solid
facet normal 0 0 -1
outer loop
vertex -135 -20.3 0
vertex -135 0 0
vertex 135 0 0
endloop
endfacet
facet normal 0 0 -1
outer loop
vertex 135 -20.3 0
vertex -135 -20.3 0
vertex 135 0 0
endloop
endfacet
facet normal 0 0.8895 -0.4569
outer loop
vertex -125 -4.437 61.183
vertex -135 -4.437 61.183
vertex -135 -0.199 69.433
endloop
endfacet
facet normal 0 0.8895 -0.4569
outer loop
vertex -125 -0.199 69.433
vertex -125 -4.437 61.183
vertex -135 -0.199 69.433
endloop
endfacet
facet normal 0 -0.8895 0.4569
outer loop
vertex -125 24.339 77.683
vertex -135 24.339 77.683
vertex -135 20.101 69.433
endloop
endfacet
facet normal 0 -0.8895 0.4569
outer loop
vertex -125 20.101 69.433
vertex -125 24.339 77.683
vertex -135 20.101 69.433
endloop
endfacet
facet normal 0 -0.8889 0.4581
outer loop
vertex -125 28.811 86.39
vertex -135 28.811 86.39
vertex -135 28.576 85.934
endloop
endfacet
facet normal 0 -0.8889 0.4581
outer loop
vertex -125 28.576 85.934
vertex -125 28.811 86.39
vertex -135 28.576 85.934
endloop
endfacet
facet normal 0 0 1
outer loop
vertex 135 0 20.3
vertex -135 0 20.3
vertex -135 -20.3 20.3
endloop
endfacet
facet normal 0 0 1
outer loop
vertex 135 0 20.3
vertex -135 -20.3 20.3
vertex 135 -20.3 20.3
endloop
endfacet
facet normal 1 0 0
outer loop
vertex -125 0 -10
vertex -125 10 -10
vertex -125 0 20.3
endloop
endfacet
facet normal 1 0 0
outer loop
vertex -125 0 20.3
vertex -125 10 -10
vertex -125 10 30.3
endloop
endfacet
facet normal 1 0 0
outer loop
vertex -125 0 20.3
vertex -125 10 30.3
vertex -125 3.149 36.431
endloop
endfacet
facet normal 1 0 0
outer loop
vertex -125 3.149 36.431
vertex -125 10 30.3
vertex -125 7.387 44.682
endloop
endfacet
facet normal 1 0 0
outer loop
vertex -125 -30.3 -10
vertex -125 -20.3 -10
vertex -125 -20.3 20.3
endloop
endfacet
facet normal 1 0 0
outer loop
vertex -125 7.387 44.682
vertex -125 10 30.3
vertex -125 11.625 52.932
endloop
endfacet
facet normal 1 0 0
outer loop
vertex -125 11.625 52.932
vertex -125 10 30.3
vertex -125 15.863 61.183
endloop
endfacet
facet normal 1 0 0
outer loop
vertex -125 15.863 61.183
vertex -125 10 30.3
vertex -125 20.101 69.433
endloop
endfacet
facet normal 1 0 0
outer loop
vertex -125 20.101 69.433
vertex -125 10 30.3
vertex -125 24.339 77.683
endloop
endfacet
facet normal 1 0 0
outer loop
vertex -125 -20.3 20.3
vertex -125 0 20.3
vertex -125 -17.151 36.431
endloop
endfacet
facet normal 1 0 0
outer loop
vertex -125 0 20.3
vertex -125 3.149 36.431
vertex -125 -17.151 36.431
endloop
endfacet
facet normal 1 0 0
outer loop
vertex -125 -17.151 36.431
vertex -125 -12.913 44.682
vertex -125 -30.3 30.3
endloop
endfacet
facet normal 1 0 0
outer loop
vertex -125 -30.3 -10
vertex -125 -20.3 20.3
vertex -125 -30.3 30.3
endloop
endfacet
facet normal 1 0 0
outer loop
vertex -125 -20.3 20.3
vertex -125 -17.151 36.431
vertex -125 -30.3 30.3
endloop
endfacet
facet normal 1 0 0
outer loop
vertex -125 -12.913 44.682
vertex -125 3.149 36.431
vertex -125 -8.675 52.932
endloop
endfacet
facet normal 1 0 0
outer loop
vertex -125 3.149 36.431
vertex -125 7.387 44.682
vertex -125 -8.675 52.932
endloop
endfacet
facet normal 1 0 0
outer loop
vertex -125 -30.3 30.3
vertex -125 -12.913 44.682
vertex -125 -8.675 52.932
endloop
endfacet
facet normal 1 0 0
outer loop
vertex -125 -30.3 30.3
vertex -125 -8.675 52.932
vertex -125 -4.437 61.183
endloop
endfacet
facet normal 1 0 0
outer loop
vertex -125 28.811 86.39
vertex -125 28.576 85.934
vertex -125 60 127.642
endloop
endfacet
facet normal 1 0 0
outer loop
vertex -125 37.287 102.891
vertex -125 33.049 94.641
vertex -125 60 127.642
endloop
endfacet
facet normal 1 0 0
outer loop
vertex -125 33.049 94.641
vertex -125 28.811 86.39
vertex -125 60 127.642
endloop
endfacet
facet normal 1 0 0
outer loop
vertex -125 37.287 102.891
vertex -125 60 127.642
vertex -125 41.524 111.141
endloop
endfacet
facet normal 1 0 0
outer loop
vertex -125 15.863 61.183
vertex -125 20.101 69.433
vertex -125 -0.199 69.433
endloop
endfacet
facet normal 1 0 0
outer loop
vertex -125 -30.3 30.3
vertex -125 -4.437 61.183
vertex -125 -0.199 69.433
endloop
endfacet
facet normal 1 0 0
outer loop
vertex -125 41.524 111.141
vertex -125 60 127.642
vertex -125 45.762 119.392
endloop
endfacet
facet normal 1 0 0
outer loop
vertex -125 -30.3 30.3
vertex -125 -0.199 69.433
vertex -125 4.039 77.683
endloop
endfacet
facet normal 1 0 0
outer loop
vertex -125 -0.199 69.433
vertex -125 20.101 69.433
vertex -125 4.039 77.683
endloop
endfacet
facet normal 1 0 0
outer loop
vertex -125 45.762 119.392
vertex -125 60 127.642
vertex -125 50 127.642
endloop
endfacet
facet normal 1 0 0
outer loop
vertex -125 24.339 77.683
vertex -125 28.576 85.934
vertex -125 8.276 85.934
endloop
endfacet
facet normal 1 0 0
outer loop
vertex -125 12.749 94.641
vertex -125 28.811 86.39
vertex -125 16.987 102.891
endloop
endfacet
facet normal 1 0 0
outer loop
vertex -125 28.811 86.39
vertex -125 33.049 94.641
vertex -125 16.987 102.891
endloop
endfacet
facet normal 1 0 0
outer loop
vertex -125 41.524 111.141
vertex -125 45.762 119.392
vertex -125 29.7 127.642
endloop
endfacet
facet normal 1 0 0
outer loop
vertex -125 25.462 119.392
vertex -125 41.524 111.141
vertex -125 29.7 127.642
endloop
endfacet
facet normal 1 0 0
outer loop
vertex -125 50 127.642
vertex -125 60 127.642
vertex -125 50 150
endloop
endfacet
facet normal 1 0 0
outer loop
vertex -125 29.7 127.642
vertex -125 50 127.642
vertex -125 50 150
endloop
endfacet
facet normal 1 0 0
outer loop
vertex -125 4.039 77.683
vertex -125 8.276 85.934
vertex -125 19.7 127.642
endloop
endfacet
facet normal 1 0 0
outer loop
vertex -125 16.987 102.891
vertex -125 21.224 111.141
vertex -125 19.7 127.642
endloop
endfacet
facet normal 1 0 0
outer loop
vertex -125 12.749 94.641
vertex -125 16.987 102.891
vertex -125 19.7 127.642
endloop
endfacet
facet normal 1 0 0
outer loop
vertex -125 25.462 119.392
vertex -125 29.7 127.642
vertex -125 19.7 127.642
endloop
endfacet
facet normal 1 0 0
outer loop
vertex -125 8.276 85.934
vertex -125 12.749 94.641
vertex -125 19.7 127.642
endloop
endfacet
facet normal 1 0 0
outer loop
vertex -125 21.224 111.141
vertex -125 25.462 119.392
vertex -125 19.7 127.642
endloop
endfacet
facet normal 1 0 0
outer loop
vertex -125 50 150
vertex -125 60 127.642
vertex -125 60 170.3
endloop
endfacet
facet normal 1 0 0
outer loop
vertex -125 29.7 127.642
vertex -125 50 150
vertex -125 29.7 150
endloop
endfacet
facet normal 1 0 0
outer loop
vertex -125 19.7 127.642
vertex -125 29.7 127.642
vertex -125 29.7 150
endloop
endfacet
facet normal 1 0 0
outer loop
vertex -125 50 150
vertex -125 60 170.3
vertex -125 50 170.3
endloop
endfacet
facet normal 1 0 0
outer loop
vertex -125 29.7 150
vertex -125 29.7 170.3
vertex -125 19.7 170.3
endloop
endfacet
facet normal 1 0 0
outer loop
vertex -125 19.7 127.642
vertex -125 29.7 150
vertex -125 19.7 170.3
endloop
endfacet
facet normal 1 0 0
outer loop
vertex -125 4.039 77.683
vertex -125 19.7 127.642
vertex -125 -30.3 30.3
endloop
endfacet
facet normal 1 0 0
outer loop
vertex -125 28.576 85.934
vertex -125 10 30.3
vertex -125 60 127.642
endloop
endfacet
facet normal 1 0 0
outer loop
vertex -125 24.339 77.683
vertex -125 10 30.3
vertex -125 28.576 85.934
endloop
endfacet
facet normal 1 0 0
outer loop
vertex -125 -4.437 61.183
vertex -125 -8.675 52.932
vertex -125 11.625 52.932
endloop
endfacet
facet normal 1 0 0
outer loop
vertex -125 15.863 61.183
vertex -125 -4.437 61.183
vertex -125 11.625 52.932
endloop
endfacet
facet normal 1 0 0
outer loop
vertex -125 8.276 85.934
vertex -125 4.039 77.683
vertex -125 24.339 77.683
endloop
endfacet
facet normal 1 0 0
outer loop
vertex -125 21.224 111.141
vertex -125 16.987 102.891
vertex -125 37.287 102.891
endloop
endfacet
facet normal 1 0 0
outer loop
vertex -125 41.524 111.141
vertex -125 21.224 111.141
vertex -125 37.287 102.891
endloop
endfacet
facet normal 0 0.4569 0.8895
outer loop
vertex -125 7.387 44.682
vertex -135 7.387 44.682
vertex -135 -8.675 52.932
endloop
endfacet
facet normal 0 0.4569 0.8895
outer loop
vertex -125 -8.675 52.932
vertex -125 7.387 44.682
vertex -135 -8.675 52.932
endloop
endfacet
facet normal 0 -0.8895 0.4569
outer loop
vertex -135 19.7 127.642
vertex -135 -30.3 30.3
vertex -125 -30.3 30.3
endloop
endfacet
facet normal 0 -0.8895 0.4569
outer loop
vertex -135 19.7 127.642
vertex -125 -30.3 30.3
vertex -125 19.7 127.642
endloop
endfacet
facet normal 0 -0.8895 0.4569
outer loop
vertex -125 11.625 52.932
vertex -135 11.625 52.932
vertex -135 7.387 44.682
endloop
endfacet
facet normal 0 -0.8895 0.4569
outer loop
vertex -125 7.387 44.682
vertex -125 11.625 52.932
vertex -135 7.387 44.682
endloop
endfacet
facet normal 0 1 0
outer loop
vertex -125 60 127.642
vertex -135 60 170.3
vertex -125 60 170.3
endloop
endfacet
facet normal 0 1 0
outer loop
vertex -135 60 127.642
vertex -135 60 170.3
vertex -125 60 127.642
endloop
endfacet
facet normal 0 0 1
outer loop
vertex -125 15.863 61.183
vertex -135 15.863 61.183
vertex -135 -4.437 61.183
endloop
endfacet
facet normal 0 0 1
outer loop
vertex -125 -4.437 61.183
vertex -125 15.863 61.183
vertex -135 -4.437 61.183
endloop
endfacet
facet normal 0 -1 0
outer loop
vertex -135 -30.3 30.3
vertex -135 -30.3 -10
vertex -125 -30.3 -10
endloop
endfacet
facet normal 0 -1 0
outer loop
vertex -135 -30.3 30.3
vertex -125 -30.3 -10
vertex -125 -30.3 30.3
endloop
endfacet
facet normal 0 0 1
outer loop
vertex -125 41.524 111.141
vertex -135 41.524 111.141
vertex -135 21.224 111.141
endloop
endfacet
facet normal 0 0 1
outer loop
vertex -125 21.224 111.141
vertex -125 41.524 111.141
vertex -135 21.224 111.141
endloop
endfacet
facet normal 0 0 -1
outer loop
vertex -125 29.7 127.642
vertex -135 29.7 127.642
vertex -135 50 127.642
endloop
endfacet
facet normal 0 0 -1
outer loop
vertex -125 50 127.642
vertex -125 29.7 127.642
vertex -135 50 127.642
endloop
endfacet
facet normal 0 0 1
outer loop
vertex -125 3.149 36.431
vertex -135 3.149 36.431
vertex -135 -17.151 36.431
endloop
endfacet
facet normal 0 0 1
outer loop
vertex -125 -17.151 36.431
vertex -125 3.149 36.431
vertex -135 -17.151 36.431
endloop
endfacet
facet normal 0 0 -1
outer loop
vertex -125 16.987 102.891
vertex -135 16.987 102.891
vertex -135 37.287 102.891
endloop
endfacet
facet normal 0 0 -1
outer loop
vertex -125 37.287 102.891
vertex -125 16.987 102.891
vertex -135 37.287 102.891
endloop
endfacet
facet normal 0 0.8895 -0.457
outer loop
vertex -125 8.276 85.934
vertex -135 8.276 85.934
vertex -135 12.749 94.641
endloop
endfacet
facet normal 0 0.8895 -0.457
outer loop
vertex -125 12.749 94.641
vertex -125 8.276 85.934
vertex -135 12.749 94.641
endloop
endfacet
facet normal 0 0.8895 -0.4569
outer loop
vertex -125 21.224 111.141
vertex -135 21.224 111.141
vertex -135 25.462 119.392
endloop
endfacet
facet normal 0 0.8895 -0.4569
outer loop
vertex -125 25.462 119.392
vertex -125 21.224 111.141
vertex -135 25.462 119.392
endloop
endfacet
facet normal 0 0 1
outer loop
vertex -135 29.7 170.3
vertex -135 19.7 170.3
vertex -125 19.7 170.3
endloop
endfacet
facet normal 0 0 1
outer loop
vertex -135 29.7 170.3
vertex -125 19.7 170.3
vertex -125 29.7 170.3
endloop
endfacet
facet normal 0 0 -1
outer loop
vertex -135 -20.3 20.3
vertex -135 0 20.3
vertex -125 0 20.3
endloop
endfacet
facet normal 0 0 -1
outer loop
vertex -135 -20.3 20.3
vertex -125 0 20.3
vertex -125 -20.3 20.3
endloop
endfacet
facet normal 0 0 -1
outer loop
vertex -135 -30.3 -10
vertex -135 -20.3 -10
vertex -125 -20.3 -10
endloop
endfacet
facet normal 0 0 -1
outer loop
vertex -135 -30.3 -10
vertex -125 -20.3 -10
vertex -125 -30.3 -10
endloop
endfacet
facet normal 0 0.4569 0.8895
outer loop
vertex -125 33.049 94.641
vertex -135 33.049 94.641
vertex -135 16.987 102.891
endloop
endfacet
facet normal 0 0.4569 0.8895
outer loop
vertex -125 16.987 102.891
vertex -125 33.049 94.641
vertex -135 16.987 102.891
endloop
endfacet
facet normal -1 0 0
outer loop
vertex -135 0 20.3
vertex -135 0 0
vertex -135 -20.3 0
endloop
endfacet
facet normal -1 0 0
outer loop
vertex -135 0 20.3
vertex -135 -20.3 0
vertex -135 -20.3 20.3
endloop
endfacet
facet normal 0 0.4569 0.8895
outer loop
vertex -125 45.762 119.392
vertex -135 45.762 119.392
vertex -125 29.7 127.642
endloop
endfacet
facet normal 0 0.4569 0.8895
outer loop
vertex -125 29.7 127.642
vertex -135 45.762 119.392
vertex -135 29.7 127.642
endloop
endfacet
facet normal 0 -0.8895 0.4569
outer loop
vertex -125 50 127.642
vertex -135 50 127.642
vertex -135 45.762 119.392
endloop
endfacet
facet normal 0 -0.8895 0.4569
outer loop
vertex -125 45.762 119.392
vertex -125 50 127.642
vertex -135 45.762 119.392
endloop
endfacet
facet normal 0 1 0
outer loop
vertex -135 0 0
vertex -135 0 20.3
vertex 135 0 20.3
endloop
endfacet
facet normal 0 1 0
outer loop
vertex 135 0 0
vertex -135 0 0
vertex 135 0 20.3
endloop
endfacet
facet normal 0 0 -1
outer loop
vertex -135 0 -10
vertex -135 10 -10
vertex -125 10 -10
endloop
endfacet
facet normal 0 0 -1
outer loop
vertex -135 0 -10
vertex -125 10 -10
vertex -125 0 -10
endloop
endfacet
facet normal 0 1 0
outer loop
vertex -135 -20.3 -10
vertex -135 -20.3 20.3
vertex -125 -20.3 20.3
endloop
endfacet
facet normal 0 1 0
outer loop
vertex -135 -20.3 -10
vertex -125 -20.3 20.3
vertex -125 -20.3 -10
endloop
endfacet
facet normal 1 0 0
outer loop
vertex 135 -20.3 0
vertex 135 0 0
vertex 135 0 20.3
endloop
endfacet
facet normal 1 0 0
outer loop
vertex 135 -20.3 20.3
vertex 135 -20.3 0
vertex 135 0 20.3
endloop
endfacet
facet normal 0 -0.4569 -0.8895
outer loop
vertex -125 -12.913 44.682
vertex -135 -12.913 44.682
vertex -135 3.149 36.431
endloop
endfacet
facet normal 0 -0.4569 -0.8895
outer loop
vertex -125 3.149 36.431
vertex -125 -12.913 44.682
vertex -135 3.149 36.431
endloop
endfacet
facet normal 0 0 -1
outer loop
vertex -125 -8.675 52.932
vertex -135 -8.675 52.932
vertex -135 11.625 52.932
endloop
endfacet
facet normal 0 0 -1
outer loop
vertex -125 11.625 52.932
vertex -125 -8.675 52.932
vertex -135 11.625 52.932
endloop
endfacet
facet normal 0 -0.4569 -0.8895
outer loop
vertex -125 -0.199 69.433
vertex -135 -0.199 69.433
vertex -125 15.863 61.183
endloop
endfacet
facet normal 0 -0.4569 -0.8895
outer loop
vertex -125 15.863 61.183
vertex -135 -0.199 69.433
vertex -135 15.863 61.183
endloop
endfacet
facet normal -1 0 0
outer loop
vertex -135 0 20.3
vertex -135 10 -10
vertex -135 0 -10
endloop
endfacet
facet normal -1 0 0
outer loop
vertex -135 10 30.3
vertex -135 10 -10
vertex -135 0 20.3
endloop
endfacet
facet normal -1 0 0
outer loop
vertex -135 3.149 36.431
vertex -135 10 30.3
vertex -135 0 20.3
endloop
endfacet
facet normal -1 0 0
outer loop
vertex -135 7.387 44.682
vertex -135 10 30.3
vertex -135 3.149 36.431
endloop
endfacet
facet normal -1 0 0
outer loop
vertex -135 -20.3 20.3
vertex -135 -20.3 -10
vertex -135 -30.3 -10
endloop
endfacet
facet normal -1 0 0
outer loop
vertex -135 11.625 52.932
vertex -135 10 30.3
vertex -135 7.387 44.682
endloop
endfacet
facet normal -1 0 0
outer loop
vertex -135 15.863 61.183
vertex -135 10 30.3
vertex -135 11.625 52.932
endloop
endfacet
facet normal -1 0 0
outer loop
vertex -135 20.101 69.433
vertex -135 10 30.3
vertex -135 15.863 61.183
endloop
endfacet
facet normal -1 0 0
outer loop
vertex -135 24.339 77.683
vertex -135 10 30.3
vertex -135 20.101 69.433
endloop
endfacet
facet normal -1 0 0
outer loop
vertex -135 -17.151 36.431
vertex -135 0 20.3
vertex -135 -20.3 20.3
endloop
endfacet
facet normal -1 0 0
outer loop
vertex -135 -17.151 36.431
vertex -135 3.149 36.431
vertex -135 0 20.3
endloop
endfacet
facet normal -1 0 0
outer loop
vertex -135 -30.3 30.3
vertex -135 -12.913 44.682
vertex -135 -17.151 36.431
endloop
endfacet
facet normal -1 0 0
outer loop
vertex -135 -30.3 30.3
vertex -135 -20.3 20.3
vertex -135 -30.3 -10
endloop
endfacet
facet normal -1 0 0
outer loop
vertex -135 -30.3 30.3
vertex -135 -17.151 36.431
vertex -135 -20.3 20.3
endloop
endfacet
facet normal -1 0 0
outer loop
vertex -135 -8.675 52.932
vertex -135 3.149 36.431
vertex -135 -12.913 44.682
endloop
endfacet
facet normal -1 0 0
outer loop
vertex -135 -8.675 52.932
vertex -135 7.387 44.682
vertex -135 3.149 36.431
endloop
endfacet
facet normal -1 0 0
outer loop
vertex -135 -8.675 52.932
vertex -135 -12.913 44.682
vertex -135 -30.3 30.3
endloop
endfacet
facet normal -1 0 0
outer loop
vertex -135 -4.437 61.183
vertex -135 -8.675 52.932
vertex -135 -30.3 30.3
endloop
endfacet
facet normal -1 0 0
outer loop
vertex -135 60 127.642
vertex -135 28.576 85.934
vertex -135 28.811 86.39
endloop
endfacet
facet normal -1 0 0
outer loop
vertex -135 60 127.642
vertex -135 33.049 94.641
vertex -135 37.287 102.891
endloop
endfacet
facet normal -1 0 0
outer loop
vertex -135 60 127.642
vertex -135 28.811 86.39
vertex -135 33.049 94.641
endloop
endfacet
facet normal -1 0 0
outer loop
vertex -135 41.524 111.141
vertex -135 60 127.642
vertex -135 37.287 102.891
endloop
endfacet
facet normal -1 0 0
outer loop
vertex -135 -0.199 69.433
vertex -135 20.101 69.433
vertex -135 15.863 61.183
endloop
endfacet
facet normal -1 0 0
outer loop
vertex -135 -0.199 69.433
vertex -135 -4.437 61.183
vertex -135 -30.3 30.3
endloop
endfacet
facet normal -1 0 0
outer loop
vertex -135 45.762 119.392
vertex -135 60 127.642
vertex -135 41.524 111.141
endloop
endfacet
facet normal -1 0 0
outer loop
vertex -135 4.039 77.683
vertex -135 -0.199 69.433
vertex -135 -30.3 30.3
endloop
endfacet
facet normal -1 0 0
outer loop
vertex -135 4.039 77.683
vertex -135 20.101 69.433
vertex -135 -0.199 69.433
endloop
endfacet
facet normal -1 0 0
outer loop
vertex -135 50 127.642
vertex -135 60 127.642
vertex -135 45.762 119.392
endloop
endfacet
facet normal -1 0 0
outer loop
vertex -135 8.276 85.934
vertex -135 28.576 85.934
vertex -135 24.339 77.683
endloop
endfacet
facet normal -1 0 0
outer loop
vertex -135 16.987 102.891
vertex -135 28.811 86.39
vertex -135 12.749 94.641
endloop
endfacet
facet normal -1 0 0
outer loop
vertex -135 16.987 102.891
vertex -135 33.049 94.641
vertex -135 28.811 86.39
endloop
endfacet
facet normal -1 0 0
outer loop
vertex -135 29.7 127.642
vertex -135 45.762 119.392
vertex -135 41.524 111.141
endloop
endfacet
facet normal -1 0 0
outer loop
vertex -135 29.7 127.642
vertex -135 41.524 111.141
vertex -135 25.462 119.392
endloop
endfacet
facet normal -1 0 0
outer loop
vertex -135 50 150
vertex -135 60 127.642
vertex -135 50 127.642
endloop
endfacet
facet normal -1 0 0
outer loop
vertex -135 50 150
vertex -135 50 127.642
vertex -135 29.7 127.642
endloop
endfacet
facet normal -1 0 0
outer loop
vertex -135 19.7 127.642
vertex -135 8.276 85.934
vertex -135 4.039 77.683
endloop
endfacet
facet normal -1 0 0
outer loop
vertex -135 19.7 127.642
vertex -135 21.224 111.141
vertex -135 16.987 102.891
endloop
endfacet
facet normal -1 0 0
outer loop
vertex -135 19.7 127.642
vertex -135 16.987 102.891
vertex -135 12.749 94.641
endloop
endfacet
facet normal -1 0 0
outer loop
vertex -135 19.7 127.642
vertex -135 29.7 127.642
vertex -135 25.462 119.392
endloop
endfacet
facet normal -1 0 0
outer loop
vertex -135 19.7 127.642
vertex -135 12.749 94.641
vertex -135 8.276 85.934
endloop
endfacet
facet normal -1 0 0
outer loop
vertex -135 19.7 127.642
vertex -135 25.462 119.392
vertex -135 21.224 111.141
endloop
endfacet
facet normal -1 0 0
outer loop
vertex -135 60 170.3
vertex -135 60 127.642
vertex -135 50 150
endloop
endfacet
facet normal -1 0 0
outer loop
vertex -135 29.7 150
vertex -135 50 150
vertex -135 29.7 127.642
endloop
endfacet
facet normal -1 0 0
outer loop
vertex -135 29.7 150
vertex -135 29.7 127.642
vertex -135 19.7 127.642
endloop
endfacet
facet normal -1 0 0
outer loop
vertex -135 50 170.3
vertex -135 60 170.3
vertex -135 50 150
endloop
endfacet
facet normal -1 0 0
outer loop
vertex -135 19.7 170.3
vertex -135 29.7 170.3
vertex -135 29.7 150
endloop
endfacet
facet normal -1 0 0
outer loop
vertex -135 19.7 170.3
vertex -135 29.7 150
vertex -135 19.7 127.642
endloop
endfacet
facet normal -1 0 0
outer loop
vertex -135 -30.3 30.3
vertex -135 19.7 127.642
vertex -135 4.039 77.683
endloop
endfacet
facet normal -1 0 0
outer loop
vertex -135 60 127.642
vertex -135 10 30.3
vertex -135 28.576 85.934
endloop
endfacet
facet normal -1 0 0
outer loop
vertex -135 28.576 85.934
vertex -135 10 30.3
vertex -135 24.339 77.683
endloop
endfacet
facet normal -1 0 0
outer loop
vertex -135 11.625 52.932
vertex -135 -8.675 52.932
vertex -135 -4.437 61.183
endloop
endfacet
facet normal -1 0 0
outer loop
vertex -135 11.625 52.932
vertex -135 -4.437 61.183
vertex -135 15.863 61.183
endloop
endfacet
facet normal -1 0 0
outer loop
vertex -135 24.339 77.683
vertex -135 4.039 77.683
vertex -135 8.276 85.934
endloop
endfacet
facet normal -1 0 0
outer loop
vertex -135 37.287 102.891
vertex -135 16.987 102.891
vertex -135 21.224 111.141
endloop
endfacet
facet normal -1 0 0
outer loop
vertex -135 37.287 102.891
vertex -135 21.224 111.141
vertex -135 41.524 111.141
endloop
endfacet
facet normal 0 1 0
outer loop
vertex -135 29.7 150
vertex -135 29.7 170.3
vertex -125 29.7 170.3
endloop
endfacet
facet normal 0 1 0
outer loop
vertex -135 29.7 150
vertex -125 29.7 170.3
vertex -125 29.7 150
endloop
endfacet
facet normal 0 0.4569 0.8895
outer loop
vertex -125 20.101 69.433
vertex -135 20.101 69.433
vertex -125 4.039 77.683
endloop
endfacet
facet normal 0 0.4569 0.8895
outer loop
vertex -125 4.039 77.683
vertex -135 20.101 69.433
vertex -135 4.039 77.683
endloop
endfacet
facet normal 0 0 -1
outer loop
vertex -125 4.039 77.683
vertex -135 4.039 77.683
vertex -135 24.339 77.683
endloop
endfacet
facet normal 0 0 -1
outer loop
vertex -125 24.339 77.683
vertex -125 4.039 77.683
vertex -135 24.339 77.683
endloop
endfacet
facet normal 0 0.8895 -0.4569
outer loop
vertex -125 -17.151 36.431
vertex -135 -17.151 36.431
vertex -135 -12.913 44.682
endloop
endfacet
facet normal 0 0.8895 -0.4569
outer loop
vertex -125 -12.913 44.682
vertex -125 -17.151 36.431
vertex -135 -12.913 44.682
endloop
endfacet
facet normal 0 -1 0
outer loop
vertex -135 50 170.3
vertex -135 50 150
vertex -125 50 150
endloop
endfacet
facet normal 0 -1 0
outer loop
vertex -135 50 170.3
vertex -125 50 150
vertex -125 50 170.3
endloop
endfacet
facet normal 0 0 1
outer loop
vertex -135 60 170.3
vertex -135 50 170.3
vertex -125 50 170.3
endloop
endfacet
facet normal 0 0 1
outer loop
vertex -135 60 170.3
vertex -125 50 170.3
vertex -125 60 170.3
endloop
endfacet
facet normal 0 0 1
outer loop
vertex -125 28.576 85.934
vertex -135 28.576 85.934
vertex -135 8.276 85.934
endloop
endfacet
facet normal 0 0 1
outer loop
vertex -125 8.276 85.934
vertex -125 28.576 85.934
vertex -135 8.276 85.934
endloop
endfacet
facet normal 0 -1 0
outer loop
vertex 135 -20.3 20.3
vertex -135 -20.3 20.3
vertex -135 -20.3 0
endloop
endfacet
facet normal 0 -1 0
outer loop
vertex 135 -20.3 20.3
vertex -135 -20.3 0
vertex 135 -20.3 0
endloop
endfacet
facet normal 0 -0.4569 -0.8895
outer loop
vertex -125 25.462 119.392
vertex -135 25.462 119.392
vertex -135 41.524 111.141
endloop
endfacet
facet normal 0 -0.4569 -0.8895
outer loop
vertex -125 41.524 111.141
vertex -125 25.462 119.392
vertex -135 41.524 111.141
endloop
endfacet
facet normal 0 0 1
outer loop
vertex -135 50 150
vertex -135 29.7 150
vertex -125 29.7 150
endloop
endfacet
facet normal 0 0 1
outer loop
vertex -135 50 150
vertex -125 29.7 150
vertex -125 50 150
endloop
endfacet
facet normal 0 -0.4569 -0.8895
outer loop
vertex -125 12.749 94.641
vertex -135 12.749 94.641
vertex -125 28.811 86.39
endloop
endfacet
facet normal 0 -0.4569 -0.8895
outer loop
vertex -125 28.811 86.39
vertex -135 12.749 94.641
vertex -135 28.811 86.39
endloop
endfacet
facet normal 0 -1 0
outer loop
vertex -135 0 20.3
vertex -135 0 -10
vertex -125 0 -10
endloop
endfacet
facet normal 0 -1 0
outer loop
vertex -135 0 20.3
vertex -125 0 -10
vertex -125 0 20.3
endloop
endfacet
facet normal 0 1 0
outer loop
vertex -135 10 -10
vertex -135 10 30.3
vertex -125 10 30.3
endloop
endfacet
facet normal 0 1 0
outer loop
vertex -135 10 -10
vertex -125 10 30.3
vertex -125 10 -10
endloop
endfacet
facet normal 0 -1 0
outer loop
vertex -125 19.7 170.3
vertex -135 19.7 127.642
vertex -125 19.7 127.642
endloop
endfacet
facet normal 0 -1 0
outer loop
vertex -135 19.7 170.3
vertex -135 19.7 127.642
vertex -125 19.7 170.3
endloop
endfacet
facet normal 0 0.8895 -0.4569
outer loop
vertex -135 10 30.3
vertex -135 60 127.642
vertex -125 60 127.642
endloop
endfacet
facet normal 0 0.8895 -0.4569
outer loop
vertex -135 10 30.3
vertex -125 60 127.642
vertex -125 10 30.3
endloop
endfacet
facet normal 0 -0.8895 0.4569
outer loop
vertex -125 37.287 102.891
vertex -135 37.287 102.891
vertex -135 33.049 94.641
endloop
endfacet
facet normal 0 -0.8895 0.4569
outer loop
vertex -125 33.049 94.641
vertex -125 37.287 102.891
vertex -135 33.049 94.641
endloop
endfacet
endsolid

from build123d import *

# Parameters (mm, degrees)
F0_W     = 270
F0_H     = 20.3
F1_DEPTH = 20.3
F3_DEPTH = 10
F5_DEPTH = 25


with BuildPart() as f1:
    # F0 (on Front) → F1 (new body)
    with BuildSketch(Plane.XZ):
        with Locations((0, 10.15)):
            Rectangle(F0_W, F0_H)
    extrude(amount=F1_DEPTH)


with BuildPart() as f3:
    # F2 (on face) → F3 (new body)
    with BuildSketch(Plane(origin=(-135, 0, 0), x_dir=(0, -1, 0), z_dir=(-1, 0, 0))):
        Polygon((-10, -10), (0, -10), (0, 0), (0, 20.3), (20.3, 20.3), (20.3, 0), (20.3, -10), (30.3, -10), (30.3, 30.3), (-19.7, 127.6421670096), (-19.7, 170.3), (-29.7, 170.3), (-29.7, 150), (-50, 150), (-50, 170.3), (-60, 170.3), (-60, 127.6421670096), (-10, 30.3), align=None)
    extrude(amount=-F3_DEPTH)

    # F4 (on face) → F5 (cut)
    with BuildSketch(Plane(origin=(-135, 0, 0), x_dir=(0, -1, 0), z_dir=(-1, 0, 0))):
        Polygon((-45.7621802274, 119.3917958083), (-29.7, 127.6421670096), (-50, 127.6421670096), align=None)
        Polygon((-21.2243604547, 111.141424607), (-25.4621802274, 119.3917958083), (-41.5243604547, 111.141424607), align=None)
        Polygon((-33.0487209094, 94.6406822044), (-16.9865406821, 102.8910534057), (-37.2865406821, 102.8910534057), align=None)
        Polygon((-8.2763227241, 85.9336235825), (-12.7487209094, 94.6406822044), (-28.8109011368, 86.3903110031), (-28.5763227241, 85.9336235825), align=None)
        Polygon((-20.1006831788, 69.4328811799), (-4.0385029514, 77.6832523812), (-24.3385029514, 77.6832523812), align=None)
        Polygon((4.4371365938, 61.1825099786), (0.1993168212, 69.4328811799), (-15.8628634062, 61.1825099786), align=None)
        Polygon((-7.3872238609, 44.681767576), (8.6749563665, 52.9321387773), (-11.6250436335, 52.9321387773), align=None)
        Polygon((17.1505959118, 36.4313963747), (12.9127761391, 44.681767576), (-3.1494040882, 36.4313963747), align=None)
    extrude(amount=-F5_DEPTH, mode=Mode.SUBTRACT)


solid = Compound([f1.part, f3.part])
